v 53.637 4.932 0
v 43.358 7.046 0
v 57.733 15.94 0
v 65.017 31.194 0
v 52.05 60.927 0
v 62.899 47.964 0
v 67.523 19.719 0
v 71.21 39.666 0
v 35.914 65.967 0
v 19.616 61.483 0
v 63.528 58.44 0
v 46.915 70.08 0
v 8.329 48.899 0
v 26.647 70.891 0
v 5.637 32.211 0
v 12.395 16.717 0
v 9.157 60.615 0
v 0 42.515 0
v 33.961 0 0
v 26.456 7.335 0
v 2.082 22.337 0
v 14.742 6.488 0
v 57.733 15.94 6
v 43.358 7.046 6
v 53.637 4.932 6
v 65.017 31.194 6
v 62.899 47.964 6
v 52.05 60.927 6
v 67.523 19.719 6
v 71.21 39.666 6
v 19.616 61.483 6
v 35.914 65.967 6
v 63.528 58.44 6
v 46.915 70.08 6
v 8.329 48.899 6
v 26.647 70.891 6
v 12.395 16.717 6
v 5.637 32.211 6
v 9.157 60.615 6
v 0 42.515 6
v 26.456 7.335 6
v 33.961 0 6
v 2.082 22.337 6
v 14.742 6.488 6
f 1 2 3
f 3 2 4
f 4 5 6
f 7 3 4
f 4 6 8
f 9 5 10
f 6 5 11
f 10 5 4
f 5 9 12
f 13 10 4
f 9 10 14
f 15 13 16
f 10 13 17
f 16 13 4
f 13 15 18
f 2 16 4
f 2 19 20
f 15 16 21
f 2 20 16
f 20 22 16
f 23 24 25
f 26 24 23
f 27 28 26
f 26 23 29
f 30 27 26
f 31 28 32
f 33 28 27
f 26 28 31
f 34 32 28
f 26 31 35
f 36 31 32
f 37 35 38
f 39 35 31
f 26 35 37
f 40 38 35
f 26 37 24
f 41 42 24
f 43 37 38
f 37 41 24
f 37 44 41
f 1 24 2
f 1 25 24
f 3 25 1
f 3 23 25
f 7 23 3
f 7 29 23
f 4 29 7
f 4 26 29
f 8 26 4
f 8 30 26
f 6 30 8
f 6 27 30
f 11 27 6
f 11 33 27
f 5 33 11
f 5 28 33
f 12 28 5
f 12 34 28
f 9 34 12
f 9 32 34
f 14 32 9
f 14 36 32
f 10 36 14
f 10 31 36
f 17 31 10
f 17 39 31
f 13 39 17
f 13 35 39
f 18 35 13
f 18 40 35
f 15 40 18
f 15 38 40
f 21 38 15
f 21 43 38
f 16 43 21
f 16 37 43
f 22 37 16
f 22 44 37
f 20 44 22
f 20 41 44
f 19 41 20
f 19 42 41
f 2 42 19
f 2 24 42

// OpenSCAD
$fn = 32;

// ----------------------------------------------------------------------
// Chain sprocket: 11 teeth, 30 mm root radius
// ----------------------------------------------------------------------

// --- parameters (mm) ---
profile_height = 6;       // extrusion height
profile_points = 22;      // points of the closed outline

profile = [[65.017, 31.194], [71.21, 39.666], [62.899, 47.964], [63.528, 58.44], [52.05, 60.927], [46.915, 70.08], [35.914, 65.967], [26.647, 70.891], [19.616, 61.483], [9.157, 60.615], [8.329, 48.899], [0, 42.515], [5.637, 32.211], [2.082, 22.337], [12.395, 16.717], [14.742, 6.488], [26.456, 7.335], [33.961, 0], [43.358, 7.046], [53.637, 4.932], [57.733, 15.94], [67.523, 19.719]];  // single closed polygon, 22 points, counter clockwise

// --- the one profile operation ---
linear_extrude(height = profile_height) polygon(points = profile);
